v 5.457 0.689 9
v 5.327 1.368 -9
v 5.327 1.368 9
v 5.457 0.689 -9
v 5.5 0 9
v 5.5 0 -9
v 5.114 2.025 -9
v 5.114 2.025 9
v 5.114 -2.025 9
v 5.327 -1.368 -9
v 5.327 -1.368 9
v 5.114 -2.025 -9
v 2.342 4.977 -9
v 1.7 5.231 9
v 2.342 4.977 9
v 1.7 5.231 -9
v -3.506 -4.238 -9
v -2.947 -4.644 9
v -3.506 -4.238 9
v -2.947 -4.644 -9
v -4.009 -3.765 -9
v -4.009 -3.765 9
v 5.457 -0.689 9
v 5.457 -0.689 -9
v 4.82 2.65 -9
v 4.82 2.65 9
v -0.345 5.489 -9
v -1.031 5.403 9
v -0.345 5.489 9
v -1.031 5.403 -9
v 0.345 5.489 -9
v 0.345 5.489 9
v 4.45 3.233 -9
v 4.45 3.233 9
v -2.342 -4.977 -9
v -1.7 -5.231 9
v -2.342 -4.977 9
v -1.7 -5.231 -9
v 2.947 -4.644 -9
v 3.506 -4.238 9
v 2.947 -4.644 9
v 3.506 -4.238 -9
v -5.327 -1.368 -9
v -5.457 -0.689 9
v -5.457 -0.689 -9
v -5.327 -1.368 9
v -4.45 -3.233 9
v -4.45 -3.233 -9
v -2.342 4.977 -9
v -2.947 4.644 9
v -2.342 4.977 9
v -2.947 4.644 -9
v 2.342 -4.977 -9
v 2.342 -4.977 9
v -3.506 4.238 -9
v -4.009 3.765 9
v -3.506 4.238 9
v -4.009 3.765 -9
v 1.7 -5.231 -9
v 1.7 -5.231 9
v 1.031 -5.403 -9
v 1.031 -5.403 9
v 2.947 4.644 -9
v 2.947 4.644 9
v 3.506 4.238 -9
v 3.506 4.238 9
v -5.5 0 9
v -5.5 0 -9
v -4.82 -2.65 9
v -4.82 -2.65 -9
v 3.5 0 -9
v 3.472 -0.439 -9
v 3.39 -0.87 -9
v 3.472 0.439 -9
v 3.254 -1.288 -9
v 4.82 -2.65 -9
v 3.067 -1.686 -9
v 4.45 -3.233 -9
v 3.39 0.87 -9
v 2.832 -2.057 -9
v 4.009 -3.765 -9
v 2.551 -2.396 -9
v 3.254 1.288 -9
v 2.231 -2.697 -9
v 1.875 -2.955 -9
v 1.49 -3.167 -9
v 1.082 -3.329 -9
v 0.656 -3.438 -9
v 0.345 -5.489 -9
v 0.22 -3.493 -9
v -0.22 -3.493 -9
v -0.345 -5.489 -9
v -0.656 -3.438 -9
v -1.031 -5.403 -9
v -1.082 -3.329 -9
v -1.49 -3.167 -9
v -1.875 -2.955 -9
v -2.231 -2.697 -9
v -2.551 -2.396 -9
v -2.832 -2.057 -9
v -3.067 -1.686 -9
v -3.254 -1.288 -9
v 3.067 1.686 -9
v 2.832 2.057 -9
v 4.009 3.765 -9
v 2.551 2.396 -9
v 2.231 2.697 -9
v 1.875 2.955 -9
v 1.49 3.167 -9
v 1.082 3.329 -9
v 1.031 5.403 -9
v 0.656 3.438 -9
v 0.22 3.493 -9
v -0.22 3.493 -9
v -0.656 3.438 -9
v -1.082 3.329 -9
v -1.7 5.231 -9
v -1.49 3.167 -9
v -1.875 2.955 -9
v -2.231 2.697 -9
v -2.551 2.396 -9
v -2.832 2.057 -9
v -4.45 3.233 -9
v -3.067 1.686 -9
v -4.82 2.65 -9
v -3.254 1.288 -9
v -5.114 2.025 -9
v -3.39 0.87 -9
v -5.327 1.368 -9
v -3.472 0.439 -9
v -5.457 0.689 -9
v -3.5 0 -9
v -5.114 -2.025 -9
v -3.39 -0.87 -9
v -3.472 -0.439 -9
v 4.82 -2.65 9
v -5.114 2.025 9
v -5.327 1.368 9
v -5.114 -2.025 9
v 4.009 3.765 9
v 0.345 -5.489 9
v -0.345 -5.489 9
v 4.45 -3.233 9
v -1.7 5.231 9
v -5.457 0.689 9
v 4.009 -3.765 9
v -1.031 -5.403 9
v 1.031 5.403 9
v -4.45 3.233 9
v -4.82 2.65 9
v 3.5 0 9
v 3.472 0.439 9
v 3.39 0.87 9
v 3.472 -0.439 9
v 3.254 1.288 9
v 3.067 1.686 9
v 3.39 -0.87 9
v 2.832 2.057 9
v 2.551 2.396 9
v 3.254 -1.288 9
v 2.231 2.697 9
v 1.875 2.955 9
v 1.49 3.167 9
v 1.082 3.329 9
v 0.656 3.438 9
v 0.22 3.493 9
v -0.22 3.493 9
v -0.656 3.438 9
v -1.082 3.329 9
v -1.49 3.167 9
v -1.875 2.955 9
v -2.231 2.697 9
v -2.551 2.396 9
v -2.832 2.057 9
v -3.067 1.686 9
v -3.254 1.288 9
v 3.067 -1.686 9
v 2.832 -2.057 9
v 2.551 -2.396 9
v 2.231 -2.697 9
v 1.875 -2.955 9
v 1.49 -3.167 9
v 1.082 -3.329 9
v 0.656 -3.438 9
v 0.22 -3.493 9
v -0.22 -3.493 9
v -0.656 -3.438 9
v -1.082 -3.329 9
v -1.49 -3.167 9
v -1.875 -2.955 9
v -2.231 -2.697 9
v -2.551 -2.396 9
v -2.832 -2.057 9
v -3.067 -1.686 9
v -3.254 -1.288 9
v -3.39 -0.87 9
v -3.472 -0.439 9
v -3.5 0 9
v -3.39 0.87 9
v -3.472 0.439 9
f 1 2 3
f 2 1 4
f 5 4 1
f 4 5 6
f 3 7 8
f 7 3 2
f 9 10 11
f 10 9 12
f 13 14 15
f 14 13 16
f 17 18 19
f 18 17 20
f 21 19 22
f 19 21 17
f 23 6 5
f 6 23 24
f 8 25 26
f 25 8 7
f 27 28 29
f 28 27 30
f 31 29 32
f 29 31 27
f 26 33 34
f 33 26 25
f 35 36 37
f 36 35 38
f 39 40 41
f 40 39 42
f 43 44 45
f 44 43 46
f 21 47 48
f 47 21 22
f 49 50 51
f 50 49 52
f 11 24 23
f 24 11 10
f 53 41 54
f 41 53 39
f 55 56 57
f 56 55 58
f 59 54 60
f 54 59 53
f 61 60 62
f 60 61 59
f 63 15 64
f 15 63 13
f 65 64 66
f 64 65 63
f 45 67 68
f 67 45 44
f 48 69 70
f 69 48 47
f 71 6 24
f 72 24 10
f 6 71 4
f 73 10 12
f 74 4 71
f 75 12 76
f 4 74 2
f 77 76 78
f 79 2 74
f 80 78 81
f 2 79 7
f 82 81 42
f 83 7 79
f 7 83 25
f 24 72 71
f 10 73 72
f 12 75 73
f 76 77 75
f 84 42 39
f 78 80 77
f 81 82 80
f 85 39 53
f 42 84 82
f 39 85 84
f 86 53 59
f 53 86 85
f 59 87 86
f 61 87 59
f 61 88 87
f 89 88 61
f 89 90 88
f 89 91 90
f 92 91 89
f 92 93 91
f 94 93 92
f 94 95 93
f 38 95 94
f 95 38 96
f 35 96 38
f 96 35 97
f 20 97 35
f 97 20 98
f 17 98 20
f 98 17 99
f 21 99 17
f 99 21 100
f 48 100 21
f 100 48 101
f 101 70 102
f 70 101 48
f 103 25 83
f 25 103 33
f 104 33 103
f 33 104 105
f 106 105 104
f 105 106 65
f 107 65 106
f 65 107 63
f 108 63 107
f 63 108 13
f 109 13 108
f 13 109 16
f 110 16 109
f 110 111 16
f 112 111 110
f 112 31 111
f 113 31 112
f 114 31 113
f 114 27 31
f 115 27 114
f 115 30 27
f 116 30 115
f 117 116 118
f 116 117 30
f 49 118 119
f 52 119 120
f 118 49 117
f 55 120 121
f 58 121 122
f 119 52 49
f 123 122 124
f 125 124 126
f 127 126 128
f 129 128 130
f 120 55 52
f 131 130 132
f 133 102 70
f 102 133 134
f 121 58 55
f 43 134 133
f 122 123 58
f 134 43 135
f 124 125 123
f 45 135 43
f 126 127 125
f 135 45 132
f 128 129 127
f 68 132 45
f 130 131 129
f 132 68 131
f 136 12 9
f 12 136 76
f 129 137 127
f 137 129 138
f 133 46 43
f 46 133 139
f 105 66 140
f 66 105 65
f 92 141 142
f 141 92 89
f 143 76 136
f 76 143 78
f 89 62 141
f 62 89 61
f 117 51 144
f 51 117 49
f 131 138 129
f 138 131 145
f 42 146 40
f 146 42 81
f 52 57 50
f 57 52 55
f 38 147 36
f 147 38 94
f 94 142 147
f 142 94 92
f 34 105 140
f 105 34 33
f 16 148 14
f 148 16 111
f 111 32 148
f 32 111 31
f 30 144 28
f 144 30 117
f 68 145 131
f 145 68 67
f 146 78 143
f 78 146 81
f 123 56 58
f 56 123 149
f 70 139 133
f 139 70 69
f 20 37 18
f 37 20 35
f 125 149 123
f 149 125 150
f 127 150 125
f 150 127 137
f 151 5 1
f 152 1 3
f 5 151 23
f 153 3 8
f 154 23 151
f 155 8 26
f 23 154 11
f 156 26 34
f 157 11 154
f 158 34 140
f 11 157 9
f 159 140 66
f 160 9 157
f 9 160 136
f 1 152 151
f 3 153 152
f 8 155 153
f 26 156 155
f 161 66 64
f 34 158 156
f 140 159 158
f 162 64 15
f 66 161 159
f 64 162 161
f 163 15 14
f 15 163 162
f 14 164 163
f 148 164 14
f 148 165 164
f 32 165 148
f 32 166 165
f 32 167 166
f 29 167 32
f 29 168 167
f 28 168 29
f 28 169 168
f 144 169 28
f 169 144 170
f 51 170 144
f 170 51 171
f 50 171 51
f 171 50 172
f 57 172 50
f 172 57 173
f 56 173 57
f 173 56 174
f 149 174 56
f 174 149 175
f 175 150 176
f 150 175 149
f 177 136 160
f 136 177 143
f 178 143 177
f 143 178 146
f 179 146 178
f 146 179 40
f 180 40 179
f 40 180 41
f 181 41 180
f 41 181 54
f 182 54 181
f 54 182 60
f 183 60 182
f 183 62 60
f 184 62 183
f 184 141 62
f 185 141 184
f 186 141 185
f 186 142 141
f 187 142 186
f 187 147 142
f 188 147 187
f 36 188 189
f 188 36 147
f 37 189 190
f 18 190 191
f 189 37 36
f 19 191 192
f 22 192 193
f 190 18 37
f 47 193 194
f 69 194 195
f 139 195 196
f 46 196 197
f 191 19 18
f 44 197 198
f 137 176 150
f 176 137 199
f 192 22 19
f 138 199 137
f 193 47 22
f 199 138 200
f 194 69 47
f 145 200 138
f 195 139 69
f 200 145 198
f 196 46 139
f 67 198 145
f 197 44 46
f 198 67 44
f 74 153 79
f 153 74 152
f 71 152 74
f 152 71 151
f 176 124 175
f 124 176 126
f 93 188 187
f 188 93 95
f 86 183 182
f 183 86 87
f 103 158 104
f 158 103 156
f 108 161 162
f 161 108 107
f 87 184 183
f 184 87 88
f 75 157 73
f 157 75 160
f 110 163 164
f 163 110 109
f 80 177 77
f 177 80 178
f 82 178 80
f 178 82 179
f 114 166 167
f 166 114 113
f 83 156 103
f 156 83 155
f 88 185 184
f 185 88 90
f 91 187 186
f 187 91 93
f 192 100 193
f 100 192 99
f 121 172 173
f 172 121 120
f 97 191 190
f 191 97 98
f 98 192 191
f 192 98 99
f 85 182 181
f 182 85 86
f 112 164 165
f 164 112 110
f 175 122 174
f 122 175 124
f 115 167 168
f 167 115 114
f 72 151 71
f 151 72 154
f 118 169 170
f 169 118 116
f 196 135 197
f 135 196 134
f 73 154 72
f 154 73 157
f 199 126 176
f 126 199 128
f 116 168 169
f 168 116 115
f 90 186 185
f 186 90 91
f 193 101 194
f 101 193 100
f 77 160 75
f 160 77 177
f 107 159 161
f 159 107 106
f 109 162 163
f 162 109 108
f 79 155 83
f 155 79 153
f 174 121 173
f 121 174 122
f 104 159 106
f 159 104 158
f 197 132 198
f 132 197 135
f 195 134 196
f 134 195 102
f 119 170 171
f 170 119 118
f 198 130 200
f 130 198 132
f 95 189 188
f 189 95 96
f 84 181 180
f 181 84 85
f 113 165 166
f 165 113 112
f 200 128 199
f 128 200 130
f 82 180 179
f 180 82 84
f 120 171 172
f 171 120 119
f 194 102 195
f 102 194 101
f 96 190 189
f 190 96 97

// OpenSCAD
$fn = 50;


difference() {
	union() {
		translate(v = [0, 0, -9.0000000000]) {
			cylinder(h = 18, r = 5.5000000000);
		}
	}
	union() {
		translate(v = [0, 0, -100.0000000000]) {
			cylinder(h = 200, r = 3.5000000000);
		}
	}
}
